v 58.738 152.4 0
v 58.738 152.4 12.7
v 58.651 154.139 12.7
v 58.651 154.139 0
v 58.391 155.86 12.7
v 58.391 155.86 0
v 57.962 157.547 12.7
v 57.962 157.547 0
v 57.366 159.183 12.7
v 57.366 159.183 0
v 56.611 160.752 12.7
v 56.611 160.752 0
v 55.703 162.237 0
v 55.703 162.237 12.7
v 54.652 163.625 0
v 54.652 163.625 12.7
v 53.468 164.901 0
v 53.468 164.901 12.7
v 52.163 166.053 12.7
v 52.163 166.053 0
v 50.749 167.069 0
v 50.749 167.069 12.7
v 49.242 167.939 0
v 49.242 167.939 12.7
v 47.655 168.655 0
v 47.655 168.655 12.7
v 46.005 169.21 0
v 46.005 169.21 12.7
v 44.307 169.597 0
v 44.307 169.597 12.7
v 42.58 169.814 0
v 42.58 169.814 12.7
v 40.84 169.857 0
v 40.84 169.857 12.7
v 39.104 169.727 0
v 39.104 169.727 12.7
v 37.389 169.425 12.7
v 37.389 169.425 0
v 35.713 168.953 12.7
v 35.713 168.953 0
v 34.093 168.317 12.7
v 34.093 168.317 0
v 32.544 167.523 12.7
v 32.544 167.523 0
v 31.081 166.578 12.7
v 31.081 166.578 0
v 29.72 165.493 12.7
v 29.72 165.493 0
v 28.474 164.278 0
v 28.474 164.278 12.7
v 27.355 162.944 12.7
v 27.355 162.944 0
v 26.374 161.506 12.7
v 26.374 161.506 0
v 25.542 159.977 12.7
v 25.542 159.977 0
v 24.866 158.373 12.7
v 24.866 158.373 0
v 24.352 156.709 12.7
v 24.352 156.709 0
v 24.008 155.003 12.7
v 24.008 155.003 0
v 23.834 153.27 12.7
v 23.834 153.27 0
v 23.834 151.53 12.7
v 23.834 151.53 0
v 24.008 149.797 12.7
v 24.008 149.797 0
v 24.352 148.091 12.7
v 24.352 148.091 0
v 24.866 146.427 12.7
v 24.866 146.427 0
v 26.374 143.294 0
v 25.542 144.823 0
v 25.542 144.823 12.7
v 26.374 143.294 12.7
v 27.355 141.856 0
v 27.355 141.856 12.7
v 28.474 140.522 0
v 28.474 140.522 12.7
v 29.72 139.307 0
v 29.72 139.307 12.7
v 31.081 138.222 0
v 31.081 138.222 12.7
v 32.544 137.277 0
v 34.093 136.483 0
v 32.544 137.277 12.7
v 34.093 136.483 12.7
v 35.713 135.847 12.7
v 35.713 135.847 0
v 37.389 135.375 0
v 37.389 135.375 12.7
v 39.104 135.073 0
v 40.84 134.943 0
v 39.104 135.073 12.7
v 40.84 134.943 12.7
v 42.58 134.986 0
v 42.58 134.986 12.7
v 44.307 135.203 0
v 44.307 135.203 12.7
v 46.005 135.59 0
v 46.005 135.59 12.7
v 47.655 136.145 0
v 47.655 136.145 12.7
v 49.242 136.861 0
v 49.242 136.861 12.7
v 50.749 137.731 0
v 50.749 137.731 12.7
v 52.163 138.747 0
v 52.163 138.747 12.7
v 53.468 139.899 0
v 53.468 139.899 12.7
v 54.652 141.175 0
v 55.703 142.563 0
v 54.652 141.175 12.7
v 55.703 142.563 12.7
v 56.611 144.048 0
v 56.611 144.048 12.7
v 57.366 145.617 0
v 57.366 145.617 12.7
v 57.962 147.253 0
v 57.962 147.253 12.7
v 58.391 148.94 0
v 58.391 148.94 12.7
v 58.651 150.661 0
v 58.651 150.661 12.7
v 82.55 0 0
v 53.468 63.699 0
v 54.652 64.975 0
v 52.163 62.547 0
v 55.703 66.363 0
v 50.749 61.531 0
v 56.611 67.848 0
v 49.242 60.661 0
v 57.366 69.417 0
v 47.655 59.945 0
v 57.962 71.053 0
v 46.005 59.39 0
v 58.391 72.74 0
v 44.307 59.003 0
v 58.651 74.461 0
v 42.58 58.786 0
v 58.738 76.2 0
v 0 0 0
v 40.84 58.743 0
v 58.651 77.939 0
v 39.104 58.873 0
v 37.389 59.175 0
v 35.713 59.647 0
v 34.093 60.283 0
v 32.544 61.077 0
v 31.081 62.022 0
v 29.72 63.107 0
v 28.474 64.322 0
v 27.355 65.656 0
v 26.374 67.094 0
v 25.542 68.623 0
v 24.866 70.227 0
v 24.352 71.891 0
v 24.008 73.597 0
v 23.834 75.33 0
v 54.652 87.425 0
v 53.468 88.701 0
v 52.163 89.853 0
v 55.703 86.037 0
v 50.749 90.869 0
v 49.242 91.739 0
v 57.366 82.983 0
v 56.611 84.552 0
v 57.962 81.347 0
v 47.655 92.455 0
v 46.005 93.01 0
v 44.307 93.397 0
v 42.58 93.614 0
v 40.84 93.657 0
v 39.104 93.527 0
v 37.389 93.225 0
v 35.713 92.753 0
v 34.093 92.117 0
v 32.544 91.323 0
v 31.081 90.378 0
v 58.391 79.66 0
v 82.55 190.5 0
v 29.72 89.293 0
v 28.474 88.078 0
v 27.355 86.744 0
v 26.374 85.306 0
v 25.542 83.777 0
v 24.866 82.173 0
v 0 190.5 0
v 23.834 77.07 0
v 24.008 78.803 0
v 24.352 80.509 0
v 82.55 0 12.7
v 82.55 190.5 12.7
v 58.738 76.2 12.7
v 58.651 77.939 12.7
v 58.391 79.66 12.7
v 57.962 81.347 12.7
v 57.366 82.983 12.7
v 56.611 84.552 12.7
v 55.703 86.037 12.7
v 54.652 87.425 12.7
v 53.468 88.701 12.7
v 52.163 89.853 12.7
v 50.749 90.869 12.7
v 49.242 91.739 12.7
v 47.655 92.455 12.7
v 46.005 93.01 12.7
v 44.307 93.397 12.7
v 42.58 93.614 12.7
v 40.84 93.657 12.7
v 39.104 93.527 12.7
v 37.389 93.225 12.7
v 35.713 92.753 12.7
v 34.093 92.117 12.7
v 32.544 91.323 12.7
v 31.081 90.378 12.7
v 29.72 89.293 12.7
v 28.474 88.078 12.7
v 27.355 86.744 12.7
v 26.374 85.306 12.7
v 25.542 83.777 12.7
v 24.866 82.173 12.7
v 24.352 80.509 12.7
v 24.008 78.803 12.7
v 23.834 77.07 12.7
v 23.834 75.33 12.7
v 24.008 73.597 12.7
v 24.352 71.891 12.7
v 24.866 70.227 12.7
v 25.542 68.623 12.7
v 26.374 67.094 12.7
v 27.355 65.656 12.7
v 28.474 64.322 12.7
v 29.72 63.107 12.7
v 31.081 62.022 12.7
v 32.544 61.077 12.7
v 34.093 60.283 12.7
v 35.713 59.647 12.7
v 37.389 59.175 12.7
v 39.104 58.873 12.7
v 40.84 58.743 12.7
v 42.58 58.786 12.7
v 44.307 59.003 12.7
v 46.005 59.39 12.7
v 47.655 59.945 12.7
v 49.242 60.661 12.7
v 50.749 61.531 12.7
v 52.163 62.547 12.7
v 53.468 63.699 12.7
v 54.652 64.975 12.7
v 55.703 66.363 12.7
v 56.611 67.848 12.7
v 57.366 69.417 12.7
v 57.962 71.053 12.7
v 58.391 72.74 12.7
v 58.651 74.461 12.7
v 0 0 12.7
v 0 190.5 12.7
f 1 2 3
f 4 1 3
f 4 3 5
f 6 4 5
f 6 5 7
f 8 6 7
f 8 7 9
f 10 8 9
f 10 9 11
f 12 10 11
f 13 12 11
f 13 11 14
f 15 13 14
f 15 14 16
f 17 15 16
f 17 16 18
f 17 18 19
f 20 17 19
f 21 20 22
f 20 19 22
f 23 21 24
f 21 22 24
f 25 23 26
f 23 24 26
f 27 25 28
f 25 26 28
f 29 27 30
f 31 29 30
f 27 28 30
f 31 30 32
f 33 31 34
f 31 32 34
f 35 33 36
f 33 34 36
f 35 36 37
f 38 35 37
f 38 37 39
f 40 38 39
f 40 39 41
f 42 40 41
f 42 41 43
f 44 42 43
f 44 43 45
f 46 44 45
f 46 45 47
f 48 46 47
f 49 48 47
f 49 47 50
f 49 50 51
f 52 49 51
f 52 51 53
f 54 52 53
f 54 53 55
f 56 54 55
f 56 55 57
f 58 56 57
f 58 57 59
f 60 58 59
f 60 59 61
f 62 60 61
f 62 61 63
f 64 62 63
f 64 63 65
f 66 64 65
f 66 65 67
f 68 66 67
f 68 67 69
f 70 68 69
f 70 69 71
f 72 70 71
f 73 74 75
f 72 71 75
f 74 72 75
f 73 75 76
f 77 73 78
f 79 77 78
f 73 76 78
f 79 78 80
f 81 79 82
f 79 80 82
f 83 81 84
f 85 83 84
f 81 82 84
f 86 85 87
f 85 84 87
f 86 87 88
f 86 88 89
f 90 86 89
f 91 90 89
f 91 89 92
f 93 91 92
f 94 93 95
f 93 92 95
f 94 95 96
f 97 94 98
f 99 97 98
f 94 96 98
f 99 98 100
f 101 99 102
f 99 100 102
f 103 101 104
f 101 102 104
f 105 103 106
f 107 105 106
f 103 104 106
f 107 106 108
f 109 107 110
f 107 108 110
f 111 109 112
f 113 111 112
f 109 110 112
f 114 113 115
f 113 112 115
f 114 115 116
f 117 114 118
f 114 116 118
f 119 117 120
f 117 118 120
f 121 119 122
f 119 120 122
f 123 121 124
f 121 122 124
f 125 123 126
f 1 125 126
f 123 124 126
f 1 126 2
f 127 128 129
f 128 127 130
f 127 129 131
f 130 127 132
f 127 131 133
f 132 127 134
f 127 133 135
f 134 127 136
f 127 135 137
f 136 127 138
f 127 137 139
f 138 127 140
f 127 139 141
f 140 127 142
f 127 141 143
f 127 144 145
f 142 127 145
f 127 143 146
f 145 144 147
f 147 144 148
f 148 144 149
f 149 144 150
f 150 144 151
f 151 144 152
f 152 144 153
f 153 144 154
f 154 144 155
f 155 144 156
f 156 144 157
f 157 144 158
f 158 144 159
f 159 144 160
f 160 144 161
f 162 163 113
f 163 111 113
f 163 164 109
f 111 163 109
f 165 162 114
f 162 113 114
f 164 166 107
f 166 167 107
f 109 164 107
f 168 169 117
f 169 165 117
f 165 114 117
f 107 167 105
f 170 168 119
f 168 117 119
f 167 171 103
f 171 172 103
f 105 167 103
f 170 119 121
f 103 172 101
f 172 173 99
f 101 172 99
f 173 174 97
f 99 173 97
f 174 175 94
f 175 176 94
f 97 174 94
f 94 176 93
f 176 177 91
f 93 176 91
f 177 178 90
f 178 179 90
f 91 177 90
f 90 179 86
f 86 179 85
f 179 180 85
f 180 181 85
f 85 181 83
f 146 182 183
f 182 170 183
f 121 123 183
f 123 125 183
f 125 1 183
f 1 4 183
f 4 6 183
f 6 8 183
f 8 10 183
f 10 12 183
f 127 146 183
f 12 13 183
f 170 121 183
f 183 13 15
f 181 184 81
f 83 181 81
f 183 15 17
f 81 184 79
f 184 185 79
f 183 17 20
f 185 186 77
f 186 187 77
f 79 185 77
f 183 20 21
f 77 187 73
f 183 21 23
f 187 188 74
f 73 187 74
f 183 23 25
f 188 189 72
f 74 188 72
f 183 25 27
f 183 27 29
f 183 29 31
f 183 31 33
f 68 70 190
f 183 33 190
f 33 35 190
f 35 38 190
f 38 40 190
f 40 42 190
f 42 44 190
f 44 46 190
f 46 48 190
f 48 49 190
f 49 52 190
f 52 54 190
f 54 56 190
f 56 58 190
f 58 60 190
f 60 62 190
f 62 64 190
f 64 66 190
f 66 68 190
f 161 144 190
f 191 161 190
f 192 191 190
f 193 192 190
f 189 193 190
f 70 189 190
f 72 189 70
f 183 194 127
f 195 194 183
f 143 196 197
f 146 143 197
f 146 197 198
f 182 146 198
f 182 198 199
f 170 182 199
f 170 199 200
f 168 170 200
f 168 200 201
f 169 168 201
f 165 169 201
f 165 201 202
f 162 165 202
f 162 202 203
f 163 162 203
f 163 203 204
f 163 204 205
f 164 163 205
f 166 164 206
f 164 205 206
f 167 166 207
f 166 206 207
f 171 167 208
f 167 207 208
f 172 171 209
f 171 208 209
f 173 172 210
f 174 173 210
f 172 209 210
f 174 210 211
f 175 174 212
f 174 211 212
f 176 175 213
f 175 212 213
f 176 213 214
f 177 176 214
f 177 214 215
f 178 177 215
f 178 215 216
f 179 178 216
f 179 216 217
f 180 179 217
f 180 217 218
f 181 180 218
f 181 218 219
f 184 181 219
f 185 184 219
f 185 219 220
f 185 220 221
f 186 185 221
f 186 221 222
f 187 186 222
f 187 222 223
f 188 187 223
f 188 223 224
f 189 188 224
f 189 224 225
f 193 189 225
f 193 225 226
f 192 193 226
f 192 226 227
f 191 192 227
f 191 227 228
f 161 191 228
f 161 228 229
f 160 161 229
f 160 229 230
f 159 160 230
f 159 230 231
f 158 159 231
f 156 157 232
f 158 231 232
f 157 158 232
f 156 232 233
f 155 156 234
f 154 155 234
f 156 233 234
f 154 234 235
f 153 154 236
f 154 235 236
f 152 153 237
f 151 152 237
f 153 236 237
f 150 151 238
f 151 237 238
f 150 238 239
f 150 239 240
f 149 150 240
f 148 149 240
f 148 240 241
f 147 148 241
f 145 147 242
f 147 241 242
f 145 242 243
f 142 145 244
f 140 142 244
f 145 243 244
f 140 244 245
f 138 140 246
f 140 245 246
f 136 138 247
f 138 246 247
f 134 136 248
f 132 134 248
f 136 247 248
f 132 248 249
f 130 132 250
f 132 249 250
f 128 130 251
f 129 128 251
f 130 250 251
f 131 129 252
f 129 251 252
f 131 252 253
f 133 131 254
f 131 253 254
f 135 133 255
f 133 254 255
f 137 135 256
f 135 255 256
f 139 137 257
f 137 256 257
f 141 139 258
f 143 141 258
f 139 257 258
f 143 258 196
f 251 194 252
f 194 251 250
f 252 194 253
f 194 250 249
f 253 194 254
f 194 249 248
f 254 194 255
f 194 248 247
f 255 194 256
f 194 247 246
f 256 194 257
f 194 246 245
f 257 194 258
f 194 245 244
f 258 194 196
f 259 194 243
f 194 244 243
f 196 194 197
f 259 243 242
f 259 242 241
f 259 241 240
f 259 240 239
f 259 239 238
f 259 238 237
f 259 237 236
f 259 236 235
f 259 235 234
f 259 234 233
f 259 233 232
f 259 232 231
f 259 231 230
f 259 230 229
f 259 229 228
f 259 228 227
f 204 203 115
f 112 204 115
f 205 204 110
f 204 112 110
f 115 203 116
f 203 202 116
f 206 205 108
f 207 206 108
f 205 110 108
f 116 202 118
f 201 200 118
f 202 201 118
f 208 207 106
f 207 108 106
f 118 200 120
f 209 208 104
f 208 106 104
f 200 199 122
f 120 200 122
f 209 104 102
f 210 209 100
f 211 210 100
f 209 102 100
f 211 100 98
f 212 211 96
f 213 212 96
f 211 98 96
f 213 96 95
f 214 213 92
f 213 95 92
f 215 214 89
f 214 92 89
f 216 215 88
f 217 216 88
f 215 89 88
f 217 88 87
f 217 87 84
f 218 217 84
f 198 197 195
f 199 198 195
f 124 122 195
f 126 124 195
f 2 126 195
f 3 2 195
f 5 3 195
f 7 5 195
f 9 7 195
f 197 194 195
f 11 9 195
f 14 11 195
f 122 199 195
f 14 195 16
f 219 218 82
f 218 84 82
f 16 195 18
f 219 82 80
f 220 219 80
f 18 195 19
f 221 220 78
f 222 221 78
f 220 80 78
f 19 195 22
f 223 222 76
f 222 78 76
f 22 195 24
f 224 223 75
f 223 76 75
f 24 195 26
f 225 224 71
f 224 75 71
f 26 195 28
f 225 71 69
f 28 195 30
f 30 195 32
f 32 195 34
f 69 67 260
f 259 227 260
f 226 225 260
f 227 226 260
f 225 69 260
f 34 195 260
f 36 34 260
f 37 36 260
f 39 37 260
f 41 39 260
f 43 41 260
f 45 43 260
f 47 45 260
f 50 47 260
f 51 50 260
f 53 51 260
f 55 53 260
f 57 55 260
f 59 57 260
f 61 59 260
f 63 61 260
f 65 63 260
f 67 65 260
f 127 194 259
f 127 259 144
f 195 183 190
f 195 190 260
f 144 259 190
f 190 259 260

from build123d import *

# Parameters (mm, degrees)
F1_DEPTH = 82.55
F2_R     = 17.4625
F3_DEPTH = 25.4
F4_W     = 82.55
F4_H     = 114.3
F5_DEPTH = 25.401


with BuildPart() as f1:
    # F0 (on Right) → F1 (new body)
    with BuildSketch(Plane.YZ):
        Polygon((0, 127), (0, 0), (190.5, 0), (190.5, 12.7), (25.4, 12.7), (25.4, 127), align=None)
    extrude(amount=F1_DEPTH)

    # F2 (on face) → F3 (cut)
    with BuildSketch(Plane.XY.offset(12.7)):
        with Locations((41.275, 76.2)):
            Circle(F2_R)
        with Locations((41.275, 152.4)):
            Circle(F2_R)
    extrude(amount=-F3_DEPTH, mode=Mode.SUBTRACT)

    # F4 (on face) → F5 (cut, through all)
    with BuildSketch(Plane(origin=(0, 25.4, 0), x_dir=(-1, 0, 0), z_dir=(0, 1, 0))):
        with Locations((-41.275, 69.85)):
            Rectangle(F4_W, F4_H)
    extrude(amount=-F5_DEPTH, mode=Mode.SUBTRACT)


solid = f1.part
